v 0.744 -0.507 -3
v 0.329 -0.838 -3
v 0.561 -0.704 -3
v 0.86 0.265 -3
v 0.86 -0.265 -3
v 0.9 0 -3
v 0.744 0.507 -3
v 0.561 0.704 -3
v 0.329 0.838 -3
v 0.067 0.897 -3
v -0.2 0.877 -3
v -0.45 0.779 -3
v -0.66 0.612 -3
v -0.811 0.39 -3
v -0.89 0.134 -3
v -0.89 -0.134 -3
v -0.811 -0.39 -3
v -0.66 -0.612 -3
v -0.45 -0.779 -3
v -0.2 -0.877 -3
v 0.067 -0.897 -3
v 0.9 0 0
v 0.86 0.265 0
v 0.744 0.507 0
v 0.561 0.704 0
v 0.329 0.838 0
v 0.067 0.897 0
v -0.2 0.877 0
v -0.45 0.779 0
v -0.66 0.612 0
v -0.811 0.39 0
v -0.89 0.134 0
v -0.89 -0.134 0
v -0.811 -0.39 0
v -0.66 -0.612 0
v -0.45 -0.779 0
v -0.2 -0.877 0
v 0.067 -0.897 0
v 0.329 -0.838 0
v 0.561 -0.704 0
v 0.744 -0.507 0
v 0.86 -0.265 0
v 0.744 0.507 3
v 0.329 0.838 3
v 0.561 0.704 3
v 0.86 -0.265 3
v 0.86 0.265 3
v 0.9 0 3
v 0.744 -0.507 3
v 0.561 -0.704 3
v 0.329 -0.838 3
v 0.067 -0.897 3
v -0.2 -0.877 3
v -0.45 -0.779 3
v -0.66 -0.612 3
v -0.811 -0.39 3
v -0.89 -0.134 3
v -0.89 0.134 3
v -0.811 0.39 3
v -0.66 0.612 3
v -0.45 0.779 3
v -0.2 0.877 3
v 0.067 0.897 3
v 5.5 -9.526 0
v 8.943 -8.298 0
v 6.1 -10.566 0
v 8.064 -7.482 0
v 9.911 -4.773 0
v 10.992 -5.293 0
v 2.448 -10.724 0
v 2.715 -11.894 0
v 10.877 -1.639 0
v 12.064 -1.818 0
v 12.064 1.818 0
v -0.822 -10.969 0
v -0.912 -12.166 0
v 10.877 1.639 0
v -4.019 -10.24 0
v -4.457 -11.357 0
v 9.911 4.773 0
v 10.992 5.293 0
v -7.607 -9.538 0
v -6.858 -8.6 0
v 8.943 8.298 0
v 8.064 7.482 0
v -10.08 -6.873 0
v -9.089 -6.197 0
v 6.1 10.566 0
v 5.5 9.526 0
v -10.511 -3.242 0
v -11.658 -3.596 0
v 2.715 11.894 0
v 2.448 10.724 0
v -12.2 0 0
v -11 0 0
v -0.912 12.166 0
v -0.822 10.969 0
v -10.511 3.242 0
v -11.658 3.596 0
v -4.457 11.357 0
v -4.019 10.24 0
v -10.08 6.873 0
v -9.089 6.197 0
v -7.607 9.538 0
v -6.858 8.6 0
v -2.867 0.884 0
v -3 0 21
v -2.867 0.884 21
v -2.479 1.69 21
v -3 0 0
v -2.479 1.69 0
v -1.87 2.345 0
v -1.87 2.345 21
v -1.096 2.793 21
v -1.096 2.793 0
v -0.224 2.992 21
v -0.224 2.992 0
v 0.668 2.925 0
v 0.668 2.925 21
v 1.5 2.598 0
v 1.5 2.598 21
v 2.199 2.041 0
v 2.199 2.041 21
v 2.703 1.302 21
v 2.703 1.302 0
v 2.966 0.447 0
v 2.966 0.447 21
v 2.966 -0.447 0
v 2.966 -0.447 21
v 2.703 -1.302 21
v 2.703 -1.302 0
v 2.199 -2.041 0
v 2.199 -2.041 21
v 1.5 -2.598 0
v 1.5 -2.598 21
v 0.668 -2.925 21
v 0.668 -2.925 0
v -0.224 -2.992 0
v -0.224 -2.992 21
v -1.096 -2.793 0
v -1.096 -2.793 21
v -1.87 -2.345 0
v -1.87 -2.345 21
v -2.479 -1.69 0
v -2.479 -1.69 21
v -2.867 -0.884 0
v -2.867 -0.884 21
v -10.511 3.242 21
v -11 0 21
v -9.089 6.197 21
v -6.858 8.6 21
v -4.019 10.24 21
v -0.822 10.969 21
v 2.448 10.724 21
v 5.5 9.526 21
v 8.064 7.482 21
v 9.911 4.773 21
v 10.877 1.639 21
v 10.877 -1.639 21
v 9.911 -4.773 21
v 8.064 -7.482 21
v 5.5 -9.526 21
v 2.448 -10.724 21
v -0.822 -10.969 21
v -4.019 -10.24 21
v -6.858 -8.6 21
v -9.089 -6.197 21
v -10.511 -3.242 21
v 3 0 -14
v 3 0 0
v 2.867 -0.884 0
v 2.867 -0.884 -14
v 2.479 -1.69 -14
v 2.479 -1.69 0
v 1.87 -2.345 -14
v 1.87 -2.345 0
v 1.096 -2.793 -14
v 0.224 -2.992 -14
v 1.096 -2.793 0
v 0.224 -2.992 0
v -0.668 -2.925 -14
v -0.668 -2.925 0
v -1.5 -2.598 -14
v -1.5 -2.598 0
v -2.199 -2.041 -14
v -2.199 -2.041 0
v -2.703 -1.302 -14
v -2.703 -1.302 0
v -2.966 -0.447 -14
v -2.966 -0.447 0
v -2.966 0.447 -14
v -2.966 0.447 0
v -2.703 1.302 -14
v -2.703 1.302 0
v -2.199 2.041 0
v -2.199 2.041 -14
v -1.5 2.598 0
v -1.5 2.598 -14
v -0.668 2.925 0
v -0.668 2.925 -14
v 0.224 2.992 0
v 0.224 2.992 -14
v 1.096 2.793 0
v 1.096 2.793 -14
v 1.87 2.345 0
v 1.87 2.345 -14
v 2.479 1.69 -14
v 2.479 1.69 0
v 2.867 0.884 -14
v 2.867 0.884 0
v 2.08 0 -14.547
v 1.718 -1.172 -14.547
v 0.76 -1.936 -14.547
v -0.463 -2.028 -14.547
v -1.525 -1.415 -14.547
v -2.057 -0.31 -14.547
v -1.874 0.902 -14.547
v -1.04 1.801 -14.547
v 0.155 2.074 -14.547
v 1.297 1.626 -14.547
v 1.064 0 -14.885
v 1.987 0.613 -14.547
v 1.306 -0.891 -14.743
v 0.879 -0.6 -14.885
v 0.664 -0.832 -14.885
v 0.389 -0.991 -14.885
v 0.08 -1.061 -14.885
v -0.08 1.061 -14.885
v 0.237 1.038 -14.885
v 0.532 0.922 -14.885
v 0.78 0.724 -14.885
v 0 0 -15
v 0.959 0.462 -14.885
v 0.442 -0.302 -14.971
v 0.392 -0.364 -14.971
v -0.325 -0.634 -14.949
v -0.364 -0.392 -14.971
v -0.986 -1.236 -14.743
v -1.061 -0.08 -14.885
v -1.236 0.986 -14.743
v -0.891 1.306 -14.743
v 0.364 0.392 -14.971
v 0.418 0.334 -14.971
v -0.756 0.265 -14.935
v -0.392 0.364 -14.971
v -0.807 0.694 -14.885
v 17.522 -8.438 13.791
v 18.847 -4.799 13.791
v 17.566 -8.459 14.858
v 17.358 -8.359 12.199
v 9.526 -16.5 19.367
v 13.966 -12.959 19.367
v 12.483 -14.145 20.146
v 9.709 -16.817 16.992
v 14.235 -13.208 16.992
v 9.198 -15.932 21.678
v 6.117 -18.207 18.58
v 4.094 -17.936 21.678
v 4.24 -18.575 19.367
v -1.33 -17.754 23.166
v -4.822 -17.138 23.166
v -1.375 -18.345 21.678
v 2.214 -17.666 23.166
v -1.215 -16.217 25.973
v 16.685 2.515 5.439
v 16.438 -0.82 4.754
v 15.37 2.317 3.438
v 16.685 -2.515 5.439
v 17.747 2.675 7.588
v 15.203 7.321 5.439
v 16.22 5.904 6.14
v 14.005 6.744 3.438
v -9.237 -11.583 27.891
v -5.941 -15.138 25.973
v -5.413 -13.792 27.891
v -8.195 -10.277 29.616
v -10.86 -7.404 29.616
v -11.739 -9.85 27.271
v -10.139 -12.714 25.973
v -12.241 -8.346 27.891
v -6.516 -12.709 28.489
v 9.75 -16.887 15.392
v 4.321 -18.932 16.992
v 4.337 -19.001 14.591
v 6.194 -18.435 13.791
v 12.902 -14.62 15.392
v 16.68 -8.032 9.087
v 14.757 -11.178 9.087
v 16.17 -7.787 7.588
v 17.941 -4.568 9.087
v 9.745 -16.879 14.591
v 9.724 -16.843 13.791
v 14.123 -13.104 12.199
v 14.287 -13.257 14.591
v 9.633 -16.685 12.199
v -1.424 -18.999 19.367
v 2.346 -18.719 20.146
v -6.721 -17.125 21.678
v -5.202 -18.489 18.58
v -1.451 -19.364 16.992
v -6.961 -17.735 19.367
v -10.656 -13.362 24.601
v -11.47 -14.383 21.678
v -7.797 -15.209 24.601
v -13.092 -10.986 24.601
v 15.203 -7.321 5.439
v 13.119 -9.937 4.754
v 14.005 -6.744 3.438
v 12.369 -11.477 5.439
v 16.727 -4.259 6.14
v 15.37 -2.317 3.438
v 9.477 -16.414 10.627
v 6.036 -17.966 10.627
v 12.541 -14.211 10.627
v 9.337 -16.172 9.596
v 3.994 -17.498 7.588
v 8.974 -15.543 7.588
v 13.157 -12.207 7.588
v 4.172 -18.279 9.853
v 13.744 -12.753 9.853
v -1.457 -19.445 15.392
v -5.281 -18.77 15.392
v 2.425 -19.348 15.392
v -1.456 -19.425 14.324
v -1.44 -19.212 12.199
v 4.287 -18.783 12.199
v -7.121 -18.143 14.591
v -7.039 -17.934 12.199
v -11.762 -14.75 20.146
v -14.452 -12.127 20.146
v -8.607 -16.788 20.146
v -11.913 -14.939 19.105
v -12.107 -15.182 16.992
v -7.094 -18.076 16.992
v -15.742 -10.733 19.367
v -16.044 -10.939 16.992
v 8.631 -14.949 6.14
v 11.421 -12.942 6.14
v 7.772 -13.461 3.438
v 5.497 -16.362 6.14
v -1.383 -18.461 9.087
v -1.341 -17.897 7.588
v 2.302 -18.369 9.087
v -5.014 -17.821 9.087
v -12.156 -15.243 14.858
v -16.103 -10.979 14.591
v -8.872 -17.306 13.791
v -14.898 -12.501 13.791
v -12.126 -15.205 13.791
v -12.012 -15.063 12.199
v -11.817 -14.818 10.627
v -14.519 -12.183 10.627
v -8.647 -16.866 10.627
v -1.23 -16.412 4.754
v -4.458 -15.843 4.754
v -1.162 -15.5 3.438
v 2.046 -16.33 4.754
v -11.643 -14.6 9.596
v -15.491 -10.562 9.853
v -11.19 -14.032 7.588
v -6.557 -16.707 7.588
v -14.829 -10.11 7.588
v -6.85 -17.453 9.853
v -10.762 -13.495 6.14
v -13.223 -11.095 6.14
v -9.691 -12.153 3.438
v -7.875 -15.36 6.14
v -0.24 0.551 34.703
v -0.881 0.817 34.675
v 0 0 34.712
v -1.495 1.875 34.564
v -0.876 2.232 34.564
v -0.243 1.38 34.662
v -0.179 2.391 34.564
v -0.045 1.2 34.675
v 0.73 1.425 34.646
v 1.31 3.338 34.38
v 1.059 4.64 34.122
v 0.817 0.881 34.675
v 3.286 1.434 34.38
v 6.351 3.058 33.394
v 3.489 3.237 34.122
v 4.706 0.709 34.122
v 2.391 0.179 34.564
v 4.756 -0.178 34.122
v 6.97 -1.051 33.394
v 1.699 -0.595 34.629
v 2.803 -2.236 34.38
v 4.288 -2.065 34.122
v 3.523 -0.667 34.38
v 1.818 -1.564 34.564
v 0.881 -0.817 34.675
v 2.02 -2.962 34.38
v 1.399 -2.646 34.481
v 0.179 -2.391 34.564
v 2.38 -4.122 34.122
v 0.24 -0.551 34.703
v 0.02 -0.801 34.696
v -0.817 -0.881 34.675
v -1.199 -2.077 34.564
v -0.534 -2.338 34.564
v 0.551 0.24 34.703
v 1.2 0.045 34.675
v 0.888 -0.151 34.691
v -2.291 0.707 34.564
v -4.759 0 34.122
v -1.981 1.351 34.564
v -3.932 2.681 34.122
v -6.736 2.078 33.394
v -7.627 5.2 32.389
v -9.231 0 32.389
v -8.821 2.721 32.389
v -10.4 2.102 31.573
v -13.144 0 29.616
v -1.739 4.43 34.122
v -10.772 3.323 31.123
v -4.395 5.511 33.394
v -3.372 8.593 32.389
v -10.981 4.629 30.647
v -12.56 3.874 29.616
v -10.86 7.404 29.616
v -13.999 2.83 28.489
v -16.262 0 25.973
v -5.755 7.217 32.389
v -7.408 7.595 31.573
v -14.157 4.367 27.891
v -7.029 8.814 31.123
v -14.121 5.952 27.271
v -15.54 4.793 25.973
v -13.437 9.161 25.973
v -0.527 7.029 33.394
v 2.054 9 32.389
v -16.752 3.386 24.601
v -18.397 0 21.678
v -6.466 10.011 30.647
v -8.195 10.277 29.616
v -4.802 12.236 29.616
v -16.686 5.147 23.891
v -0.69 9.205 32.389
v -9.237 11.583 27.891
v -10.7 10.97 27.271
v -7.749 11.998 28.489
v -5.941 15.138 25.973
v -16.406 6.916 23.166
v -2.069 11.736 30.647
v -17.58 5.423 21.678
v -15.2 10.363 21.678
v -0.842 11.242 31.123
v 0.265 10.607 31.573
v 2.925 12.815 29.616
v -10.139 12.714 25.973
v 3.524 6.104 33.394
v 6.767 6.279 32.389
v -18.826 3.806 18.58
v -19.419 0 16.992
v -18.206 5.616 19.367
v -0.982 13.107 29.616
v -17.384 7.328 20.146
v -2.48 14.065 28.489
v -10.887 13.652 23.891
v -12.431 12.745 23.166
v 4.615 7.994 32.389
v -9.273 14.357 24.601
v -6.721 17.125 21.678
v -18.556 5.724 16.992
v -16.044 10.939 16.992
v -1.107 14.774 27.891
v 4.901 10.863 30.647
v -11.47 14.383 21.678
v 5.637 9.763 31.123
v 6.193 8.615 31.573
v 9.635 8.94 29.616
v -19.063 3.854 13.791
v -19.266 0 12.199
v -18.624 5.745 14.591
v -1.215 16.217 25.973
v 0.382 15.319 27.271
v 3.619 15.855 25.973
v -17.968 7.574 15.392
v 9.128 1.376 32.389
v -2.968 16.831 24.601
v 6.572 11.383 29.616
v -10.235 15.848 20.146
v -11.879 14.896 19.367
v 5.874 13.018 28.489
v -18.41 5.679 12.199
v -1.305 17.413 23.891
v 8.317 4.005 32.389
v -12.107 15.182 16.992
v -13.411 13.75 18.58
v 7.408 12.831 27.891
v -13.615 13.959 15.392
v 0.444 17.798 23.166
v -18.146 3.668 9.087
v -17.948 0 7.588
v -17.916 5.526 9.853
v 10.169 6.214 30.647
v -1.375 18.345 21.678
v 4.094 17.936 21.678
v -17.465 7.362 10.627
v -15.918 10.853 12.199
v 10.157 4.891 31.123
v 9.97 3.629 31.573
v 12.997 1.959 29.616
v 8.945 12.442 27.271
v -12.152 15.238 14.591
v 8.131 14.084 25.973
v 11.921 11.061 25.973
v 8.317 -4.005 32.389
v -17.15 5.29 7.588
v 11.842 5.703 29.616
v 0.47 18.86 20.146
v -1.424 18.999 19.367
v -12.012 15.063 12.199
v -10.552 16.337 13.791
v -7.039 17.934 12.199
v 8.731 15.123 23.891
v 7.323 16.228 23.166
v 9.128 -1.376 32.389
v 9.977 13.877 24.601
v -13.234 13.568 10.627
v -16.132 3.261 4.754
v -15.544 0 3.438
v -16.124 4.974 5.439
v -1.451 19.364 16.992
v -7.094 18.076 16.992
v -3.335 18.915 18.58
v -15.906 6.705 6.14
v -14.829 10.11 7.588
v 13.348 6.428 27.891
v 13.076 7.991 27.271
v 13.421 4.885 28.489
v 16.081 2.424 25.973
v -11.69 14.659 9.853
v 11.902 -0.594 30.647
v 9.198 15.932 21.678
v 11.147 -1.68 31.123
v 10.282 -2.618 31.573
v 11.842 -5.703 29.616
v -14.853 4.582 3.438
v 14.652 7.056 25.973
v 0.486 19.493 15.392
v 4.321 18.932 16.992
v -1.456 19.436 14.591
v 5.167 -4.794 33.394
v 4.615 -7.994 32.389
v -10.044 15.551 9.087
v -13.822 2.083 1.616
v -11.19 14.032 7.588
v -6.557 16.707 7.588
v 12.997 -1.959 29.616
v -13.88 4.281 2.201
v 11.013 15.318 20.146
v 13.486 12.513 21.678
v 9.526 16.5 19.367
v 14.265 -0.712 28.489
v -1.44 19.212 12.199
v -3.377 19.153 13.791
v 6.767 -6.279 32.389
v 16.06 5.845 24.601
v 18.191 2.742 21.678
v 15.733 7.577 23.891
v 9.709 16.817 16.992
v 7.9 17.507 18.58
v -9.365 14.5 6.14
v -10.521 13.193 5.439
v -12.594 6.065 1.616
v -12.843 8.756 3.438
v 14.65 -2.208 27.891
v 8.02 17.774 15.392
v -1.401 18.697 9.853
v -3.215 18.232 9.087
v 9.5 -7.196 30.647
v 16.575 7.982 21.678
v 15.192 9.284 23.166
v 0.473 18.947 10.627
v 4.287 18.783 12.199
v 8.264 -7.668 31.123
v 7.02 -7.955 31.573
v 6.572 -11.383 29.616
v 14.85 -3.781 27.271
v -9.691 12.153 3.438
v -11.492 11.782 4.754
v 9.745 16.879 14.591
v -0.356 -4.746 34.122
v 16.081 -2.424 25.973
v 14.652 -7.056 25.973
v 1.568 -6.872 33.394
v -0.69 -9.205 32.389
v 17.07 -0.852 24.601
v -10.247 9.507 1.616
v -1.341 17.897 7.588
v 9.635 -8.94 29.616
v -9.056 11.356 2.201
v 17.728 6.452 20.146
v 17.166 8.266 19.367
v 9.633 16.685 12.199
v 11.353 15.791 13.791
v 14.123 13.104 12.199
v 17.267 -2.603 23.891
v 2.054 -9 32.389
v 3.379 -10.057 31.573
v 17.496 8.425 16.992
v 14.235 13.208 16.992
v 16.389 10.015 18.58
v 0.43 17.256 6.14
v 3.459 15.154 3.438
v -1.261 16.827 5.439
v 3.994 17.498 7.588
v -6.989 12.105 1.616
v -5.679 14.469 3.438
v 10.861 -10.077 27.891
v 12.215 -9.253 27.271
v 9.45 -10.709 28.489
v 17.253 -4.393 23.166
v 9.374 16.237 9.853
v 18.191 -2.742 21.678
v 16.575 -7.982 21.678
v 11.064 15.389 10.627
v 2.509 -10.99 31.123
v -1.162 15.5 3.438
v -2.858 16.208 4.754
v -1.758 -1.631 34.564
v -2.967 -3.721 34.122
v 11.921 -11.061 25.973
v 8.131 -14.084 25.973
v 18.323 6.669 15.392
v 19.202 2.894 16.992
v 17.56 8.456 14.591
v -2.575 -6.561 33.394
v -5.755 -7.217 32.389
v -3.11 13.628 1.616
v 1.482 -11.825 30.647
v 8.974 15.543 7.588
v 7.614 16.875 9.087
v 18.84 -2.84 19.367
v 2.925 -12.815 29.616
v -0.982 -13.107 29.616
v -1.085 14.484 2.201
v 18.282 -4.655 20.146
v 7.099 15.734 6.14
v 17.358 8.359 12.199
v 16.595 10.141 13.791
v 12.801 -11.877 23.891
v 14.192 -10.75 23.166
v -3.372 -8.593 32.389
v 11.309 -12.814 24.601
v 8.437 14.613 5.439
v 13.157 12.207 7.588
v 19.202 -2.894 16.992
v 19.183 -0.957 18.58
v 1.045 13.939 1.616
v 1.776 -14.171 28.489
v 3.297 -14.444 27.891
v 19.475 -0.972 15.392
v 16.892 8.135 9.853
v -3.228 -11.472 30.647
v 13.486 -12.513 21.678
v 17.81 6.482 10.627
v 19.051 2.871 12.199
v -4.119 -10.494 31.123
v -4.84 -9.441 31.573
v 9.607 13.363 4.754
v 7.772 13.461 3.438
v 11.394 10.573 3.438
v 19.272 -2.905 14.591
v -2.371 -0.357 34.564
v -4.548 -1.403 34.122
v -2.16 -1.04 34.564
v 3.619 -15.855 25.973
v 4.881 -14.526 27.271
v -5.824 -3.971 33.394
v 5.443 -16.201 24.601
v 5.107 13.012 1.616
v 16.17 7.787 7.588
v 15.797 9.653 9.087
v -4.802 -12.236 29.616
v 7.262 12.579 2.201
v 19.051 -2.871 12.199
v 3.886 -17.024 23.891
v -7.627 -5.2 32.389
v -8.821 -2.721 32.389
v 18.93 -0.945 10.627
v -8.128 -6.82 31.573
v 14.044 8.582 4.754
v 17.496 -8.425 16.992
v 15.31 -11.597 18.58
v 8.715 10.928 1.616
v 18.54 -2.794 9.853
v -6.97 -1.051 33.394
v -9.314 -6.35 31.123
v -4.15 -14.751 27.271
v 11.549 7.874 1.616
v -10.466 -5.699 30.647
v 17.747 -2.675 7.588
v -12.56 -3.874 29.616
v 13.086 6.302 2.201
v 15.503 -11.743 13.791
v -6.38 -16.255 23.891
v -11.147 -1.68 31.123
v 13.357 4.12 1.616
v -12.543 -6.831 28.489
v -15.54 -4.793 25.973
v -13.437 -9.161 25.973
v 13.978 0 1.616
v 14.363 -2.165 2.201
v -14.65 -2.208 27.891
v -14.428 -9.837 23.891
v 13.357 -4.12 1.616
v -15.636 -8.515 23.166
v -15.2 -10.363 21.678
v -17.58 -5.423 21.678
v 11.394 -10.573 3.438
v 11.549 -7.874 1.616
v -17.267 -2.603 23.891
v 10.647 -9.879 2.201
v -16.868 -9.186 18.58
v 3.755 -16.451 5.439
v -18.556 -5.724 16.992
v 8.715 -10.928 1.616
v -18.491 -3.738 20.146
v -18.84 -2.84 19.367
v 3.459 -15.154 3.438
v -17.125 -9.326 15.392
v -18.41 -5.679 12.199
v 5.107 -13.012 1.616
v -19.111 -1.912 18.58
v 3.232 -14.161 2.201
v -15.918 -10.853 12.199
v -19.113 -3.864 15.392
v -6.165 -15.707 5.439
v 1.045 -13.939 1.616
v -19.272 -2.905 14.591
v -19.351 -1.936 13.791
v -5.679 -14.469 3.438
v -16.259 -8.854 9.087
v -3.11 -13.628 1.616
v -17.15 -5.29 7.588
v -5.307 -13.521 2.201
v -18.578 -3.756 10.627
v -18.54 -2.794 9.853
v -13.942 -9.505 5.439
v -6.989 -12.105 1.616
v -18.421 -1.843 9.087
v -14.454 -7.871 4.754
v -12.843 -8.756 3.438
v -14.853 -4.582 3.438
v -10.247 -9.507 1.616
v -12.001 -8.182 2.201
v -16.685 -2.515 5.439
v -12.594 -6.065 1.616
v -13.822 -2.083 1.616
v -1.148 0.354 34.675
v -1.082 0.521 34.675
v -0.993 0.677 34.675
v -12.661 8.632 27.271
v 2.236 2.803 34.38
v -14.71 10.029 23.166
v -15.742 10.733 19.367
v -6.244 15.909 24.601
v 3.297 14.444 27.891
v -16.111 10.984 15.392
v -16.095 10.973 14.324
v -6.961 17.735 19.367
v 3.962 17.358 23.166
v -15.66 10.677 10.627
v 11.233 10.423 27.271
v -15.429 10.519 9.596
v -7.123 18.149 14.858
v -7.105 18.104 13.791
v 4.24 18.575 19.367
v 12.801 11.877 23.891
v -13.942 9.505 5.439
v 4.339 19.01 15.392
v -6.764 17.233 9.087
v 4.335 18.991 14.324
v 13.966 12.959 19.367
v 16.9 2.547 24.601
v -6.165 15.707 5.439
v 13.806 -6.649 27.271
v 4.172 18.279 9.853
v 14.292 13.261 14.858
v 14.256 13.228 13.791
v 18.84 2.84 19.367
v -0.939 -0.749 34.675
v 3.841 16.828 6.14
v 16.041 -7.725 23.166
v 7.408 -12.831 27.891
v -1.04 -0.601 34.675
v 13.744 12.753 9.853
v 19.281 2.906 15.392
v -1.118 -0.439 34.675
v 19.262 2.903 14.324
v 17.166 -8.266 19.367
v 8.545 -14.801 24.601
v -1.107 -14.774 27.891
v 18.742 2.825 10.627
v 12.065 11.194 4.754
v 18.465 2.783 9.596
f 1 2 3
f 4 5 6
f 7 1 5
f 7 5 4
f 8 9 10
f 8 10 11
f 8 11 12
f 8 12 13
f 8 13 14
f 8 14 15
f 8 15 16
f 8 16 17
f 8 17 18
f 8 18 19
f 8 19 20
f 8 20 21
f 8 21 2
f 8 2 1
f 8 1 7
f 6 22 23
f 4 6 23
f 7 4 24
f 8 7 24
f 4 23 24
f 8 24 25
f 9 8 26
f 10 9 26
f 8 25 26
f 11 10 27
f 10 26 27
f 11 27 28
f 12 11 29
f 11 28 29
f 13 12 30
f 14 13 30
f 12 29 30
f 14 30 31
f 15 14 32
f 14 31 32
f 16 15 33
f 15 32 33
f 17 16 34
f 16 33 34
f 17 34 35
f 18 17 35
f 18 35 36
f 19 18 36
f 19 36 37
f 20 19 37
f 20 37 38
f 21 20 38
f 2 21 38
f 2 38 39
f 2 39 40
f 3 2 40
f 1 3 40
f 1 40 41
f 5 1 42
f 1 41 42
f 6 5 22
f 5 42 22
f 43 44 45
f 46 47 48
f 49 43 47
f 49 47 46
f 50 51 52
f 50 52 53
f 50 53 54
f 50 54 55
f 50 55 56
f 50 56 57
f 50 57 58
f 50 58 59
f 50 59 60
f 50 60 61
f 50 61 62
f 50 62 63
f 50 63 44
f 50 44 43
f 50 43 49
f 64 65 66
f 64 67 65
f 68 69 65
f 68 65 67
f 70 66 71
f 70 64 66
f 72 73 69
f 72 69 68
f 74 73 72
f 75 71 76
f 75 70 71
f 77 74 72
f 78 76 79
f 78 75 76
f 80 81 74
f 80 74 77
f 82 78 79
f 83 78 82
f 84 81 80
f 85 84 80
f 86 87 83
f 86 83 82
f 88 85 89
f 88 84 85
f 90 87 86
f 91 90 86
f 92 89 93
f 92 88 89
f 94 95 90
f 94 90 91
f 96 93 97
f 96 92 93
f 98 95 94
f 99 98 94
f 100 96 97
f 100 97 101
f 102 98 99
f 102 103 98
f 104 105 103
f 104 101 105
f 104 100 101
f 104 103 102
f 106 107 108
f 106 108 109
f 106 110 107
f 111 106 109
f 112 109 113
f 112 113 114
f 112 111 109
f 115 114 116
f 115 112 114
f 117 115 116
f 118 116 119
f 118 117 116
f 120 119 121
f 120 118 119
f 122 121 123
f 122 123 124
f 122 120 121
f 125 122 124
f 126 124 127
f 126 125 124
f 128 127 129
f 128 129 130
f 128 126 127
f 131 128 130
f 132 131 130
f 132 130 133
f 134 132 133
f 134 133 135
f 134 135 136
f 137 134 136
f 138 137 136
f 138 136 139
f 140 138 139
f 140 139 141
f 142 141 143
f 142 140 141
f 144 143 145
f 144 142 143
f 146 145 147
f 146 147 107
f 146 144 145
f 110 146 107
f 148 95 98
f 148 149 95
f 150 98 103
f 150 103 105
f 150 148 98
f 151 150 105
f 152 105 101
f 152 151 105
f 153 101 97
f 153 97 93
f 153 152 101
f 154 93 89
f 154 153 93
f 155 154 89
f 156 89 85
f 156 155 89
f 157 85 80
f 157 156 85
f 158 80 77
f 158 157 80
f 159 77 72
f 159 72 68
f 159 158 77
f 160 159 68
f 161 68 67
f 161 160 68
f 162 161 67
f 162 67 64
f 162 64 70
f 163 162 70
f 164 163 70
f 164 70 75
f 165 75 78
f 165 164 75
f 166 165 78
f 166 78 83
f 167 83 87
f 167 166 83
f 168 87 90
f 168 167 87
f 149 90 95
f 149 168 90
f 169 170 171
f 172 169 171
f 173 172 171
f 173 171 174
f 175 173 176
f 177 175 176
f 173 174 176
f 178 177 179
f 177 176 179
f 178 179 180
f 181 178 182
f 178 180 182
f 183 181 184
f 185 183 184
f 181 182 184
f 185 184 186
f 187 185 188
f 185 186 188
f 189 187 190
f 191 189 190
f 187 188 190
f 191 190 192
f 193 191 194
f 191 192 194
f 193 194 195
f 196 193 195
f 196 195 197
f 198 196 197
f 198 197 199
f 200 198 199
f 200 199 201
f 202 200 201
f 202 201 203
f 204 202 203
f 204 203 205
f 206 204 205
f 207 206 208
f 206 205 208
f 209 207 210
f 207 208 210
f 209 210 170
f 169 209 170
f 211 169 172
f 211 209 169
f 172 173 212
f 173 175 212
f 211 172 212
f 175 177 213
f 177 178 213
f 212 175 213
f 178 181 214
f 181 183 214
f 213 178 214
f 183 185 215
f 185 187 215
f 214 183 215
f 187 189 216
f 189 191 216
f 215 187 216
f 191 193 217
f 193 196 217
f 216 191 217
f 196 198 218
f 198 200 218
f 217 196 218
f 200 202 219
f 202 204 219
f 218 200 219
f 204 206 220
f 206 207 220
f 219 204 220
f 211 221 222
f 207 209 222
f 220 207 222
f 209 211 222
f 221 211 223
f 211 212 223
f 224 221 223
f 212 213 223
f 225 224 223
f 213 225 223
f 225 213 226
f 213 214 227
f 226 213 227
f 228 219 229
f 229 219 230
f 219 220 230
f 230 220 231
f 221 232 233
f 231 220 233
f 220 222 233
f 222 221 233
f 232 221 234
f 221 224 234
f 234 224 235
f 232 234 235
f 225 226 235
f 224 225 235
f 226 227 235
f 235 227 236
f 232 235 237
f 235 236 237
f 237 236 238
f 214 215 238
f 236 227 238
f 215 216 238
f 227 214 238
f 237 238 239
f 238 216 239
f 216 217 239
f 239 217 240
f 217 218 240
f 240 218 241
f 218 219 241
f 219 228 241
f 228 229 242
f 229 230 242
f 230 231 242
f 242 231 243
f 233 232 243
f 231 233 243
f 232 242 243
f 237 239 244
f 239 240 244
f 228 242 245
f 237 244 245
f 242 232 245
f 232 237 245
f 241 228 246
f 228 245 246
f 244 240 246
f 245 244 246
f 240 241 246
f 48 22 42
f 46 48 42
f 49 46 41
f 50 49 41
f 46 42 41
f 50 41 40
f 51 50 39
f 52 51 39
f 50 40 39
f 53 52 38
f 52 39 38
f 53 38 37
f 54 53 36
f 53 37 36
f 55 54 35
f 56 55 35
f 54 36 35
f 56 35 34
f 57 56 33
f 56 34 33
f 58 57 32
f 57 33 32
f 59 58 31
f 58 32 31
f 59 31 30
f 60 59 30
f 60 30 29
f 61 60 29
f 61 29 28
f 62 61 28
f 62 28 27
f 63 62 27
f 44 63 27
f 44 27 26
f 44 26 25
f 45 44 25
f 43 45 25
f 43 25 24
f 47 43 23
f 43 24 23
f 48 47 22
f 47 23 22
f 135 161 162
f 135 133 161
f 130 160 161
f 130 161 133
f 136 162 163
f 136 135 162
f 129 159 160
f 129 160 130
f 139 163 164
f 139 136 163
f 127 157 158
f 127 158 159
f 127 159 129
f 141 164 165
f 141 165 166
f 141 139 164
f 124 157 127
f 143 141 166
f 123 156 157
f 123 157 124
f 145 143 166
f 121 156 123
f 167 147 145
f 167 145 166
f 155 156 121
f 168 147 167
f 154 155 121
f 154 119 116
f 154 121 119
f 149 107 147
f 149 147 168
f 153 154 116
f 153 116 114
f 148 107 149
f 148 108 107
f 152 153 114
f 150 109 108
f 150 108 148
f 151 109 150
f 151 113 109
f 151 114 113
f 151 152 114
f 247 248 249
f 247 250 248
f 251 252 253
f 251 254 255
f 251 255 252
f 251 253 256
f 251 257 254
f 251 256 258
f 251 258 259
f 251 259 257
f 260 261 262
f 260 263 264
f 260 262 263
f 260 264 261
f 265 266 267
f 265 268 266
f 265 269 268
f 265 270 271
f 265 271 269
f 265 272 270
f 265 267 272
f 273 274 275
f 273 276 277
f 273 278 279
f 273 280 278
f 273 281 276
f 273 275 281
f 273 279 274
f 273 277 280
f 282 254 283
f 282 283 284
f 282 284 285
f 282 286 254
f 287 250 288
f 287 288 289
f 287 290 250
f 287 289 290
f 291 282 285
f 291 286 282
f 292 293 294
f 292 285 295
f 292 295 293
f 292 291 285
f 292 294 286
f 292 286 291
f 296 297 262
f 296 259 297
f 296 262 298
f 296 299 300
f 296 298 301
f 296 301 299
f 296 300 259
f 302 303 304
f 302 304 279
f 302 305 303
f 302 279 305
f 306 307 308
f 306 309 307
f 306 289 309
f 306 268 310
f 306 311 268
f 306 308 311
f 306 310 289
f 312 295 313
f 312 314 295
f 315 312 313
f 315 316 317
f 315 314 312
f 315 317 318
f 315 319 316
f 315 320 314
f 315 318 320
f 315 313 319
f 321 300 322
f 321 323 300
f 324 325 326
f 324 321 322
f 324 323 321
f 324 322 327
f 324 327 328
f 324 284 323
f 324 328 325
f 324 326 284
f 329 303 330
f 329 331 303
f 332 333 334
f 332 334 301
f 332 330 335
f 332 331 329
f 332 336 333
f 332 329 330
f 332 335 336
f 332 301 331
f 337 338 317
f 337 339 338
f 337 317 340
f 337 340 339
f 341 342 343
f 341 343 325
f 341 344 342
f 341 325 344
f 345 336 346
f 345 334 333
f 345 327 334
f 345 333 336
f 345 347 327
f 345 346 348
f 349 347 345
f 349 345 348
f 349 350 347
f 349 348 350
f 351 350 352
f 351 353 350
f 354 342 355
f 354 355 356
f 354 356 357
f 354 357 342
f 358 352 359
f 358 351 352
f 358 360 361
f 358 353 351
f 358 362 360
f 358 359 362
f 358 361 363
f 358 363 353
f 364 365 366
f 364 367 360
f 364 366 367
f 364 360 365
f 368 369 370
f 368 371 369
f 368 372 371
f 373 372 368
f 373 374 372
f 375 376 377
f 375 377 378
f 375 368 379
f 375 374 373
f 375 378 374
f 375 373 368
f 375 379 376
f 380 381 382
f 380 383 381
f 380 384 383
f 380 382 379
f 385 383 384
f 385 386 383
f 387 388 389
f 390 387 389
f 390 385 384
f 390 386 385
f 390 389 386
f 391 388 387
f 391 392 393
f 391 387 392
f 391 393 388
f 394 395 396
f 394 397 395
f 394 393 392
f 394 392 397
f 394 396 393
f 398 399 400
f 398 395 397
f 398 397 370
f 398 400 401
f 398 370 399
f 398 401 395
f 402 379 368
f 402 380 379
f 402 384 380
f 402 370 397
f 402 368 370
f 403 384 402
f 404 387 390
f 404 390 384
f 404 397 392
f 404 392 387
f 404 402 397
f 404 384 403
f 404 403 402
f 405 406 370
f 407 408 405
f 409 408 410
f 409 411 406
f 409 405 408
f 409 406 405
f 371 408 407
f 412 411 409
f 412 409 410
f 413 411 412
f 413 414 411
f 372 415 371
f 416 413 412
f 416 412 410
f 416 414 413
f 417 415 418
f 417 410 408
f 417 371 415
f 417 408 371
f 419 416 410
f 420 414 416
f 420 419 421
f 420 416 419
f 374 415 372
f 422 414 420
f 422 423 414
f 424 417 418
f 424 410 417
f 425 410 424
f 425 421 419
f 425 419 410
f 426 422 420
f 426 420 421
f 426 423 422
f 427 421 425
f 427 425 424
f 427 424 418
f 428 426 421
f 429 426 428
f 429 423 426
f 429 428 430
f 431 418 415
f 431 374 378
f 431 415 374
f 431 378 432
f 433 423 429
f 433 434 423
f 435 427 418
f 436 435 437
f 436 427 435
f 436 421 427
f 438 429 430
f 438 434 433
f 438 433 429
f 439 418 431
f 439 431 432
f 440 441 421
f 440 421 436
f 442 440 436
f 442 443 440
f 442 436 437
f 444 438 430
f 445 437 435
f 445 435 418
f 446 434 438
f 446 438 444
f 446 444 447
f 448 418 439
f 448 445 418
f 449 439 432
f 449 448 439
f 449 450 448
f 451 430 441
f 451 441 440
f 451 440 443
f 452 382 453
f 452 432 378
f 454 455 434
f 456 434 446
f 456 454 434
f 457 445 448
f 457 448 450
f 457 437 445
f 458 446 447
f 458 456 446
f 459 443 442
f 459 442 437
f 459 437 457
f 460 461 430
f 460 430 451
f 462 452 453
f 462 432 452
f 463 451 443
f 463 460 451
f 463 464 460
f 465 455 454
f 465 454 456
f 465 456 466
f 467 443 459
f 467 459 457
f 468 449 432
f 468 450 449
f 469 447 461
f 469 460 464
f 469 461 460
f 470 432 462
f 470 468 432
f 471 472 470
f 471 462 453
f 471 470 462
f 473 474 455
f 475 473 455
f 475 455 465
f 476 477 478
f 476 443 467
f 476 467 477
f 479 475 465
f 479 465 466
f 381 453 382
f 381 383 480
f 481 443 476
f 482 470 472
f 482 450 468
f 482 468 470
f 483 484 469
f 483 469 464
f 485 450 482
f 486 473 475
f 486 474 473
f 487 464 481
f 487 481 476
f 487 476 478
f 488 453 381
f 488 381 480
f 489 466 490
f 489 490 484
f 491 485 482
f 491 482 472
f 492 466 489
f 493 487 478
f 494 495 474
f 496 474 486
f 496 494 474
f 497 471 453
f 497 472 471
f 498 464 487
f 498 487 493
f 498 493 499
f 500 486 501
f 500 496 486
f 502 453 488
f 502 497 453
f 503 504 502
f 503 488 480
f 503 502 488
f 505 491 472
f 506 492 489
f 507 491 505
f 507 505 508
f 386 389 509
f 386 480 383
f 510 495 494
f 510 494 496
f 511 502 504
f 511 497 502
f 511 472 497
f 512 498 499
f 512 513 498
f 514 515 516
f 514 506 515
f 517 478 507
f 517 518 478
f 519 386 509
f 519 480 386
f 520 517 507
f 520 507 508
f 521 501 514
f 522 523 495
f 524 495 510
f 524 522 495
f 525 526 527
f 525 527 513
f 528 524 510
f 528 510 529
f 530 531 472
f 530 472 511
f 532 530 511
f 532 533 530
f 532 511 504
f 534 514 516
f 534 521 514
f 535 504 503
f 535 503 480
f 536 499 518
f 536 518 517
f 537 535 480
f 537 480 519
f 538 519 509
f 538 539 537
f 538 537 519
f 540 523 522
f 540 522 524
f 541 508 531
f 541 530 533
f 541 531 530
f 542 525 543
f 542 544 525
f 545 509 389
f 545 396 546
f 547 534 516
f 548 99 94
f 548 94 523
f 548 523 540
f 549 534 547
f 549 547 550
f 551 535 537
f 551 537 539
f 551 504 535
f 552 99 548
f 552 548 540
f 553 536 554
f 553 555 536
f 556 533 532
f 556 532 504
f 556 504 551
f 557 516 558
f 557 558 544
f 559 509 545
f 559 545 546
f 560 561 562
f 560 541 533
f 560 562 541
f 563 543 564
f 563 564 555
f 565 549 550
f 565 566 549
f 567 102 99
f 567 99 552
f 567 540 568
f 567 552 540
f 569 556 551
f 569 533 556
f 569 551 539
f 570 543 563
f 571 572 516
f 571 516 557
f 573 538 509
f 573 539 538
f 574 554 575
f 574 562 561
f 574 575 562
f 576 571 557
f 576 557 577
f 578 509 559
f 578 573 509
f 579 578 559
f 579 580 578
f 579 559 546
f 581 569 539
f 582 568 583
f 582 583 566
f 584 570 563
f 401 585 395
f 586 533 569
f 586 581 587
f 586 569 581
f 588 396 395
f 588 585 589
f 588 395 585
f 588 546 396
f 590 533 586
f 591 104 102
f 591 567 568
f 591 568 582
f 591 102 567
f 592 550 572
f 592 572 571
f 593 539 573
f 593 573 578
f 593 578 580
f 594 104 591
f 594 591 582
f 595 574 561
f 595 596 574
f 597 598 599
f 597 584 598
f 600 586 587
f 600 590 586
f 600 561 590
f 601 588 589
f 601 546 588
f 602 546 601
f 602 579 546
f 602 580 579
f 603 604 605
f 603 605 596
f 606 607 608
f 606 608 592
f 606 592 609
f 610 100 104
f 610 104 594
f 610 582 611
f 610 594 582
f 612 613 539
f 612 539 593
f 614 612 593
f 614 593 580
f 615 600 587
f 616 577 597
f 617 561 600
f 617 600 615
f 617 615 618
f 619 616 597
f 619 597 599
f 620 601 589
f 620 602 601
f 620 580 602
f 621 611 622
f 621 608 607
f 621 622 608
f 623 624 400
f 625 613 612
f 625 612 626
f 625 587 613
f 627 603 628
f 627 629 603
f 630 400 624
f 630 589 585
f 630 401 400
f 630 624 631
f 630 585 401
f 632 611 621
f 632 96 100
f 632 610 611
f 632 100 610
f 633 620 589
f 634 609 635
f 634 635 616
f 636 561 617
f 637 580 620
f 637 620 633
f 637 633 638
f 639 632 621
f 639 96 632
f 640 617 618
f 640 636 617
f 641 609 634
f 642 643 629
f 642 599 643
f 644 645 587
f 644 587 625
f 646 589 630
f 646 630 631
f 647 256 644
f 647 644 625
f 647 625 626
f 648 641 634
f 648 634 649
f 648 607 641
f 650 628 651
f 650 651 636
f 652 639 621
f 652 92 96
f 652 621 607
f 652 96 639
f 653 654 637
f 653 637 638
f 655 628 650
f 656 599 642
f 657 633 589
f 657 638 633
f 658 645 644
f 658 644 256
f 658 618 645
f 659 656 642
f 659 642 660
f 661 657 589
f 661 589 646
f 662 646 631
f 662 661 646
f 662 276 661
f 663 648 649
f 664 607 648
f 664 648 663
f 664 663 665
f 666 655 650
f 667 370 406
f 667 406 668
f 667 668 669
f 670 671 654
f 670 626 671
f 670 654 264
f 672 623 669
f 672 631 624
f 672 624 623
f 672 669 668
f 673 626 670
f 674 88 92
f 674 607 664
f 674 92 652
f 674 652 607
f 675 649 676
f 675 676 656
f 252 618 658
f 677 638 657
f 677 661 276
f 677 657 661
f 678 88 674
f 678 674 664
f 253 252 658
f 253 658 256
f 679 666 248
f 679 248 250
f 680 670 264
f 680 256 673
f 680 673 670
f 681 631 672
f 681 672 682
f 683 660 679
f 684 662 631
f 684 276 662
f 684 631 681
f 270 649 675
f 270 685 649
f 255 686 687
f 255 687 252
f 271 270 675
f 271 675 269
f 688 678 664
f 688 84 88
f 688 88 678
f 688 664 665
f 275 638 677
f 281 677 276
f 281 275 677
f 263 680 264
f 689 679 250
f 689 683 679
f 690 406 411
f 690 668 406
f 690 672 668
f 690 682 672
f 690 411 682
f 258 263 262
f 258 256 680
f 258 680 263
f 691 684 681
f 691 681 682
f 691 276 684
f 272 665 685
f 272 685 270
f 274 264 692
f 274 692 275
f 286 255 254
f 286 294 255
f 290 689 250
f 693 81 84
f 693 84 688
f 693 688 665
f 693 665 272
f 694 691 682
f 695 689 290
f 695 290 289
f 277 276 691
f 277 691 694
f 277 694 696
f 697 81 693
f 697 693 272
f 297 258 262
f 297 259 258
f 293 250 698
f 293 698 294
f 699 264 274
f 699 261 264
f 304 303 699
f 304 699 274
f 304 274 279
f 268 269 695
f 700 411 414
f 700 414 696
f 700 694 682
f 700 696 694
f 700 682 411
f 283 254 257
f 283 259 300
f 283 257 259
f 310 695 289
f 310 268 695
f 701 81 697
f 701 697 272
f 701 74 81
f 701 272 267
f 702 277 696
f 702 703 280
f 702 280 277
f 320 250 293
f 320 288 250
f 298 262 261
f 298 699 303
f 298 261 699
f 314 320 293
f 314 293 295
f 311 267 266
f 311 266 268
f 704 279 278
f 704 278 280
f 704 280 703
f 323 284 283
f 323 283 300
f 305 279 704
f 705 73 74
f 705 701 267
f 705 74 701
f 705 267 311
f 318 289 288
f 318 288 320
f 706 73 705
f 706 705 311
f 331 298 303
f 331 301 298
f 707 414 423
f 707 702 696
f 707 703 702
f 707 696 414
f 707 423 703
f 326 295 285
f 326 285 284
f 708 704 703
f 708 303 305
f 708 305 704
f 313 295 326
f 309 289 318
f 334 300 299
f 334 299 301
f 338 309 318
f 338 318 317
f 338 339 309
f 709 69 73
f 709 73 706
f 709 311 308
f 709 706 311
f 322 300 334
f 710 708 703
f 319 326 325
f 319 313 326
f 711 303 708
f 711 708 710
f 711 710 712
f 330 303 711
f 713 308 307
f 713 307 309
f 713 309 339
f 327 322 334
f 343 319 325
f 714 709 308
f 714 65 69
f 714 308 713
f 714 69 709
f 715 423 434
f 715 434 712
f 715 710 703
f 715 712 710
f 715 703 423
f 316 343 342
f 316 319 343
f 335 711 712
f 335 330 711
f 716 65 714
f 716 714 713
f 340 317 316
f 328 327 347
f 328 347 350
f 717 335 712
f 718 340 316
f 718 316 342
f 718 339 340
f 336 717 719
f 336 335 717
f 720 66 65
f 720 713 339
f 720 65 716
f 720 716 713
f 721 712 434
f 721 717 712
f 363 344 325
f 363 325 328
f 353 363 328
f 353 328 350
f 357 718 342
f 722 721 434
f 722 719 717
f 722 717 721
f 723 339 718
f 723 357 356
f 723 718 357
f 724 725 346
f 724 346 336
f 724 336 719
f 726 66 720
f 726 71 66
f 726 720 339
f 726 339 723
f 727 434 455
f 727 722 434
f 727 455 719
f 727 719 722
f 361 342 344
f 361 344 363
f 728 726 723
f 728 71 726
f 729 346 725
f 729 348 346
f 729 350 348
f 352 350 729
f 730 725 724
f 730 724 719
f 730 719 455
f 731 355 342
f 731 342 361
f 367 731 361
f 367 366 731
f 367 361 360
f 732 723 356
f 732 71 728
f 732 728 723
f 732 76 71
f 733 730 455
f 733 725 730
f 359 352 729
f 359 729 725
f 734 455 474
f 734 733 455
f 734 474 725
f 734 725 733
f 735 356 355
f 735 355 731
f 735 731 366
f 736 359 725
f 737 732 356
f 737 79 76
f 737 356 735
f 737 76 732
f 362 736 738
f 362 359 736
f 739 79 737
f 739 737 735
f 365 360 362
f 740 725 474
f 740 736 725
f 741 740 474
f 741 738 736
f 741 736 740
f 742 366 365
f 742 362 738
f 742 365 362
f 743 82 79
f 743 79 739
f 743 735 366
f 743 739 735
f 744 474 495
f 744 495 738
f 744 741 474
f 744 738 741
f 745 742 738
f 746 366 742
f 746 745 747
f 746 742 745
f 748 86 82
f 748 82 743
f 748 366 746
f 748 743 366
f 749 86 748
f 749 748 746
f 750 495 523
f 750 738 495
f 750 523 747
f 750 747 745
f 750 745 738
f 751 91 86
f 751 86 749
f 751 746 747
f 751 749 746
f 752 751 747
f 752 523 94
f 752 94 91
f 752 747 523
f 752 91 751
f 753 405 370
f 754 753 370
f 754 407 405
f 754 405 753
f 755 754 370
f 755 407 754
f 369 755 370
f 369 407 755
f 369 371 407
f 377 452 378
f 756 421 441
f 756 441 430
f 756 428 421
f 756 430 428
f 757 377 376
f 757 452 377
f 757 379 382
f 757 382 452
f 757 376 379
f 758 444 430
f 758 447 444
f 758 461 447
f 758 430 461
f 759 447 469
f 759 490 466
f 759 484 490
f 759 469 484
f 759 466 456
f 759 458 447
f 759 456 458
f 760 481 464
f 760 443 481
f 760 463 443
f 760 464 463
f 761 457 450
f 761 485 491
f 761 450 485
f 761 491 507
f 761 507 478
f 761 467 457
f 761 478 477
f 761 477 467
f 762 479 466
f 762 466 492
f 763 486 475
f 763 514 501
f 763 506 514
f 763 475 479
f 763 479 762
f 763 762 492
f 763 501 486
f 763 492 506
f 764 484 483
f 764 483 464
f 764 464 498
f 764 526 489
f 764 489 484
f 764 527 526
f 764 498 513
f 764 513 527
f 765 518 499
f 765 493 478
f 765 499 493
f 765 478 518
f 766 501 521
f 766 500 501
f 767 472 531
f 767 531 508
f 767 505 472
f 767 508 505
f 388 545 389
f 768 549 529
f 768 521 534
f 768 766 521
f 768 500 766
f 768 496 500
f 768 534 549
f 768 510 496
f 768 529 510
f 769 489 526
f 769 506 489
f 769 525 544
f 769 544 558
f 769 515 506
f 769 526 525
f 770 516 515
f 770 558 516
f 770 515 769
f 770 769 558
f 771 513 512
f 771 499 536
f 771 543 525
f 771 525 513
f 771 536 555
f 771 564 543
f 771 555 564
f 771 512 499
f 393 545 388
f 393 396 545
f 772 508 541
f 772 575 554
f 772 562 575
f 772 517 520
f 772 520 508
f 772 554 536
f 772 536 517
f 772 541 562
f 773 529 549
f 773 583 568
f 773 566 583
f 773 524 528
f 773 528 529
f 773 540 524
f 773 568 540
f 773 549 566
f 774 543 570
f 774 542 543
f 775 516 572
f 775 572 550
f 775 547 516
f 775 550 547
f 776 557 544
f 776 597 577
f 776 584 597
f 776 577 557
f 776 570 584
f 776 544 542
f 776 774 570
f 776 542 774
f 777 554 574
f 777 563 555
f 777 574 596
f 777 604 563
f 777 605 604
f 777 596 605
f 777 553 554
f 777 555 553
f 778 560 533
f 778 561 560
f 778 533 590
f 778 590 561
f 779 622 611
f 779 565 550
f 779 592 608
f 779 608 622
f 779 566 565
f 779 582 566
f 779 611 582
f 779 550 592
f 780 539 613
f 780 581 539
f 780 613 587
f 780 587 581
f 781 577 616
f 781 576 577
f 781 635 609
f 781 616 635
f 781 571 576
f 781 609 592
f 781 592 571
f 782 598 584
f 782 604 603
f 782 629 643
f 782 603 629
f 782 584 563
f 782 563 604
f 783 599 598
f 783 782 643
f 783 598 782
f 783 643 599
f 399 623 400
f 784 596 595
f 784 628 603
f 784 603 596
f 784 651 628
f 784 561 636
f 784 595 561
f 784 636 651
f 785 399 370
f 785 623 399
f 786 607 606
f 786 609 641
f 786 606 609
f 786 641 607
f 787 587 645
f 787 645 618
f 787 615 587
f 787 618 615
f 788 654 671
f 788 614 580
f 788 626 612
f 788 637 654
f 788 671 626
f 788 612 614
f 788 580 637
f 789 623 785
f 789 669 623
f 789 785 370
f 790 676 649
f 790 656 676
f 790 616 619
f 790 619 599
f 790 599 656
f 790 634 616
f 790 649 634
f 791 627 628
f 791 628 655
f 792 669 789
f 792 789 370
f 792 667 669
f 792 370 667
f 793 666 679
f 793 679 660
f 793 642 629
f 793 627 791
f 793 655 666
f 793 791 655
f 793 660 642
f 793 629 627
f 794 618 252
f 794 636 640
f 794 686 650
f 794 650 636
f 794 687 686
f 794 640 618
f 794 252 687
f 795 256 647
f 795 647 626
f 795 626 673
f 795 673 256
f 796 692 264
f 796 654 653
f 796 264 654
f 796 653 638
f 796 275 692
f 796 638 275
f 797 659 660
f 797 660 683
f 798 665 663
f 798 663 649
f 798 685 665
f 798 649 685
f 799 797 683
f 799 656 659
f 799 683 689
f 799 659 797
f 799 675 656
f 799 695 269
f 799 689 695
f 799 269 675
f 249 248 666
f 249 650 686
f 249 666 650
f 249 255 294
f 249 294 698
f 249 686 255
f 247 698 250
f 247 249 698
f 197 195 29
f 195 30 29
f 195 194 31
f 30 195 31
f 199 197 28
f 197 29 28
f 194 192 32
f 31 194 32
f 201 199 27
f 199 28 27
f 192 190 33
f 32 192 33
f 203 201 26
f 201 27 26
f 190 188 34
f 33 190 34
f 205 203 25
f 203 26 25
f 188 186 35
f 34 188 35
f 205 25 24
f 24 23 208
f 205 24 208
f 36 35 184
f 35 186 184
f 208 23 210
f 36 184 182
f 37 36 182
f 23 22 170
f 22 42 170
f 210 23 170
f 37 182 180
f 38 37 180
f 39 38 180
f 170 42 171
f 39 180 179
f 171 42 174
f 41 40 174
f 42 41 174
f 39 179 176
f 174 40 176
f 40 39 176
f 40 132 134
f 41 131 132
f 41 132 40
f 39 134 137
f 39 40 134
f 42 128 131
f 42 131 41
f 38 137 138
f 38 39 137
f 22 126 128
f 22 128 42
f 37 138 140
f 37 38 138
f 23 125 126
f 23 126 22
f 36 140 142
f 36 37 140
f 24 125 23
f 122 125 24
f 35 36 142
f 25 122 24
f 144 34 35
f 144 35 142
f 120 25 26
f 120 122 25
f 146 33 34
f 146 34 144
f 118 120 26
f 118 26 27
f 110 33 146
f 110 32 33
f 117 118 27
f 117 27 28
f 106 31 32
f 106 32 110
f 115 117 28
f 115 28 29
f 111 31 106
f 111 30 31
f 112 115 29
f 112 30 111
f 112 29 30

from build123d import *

# Parameters (mm, degrees)
F1_FACE_R = 3
F2_DEPTH  = 14
F5_R      = 0.9
F6_DEPTH  = 3
F7_R      = 0.9
F8_DEPTH  = 3


with BuildPart() as f1:
    # F0 (on Front) → F1 (revolve)
    with BuildSketch(Plane.XZ):
        with BuildLine():
            Line((0, 0), (0, 34.712166))
            ThreePointArc((0, 34.712166), (-18.396837, 21.677951), (-12.2, 0))
            Line((-12.2, 0), (-11, 0))
            Line((-11, 0), (-11, 21))
            Line((-11, 21), (-3, 21))
            Line((-3, 21), (-3, 0))
            Line((-3, 0), (0, 0))
        make_face()
    revolve(axis=Axis((0, 0, 17.356083), (0, 0, -1)))

    # F5 (on face) → F6 (cut)
    with BuildSketch(Plane(origin=(0, 0, 0), x_dir=(1, 0, 0), z_dir=(0, 0, -1))):
        Circle(F5_R)
    extrude(amount=-F6_DEPTH, mode=Mode.SUBTRACT)


with BuildPart() as f2:
    # F1_face (on face) → F2 (new body)
    with BuildSketch(Plane(origin=(0, 0, 0), x_dir=(1, 0, 0), z_dir=(0, 0, -1))):
        Circle(F1_FACE_R)
    extrude(amount=F2_DEPTH)

    # F3 (on Front) → F4 (revolve)
    with BuildSketch(Plane.XZ):
        with BuildLine():
            Line((0, -14), (0, -15))
            ThreePointArc((0, -15), (1.581139, -14.743416), (3, -14))
            Line((3, -14), (0, -14))
        make_face()
    revolve(axis=Axis((0, 0, -14.5), (0, 0, -1)))

    # F7 (on face) → F8 (cut)
    with BuildSketch(Plane.XY):
        Circle(F7_R)
    extrude(amount=-F8_DEPTH, mode=Mode.SUBTRACT)


solid = Compound([f1.part, f2.part])
